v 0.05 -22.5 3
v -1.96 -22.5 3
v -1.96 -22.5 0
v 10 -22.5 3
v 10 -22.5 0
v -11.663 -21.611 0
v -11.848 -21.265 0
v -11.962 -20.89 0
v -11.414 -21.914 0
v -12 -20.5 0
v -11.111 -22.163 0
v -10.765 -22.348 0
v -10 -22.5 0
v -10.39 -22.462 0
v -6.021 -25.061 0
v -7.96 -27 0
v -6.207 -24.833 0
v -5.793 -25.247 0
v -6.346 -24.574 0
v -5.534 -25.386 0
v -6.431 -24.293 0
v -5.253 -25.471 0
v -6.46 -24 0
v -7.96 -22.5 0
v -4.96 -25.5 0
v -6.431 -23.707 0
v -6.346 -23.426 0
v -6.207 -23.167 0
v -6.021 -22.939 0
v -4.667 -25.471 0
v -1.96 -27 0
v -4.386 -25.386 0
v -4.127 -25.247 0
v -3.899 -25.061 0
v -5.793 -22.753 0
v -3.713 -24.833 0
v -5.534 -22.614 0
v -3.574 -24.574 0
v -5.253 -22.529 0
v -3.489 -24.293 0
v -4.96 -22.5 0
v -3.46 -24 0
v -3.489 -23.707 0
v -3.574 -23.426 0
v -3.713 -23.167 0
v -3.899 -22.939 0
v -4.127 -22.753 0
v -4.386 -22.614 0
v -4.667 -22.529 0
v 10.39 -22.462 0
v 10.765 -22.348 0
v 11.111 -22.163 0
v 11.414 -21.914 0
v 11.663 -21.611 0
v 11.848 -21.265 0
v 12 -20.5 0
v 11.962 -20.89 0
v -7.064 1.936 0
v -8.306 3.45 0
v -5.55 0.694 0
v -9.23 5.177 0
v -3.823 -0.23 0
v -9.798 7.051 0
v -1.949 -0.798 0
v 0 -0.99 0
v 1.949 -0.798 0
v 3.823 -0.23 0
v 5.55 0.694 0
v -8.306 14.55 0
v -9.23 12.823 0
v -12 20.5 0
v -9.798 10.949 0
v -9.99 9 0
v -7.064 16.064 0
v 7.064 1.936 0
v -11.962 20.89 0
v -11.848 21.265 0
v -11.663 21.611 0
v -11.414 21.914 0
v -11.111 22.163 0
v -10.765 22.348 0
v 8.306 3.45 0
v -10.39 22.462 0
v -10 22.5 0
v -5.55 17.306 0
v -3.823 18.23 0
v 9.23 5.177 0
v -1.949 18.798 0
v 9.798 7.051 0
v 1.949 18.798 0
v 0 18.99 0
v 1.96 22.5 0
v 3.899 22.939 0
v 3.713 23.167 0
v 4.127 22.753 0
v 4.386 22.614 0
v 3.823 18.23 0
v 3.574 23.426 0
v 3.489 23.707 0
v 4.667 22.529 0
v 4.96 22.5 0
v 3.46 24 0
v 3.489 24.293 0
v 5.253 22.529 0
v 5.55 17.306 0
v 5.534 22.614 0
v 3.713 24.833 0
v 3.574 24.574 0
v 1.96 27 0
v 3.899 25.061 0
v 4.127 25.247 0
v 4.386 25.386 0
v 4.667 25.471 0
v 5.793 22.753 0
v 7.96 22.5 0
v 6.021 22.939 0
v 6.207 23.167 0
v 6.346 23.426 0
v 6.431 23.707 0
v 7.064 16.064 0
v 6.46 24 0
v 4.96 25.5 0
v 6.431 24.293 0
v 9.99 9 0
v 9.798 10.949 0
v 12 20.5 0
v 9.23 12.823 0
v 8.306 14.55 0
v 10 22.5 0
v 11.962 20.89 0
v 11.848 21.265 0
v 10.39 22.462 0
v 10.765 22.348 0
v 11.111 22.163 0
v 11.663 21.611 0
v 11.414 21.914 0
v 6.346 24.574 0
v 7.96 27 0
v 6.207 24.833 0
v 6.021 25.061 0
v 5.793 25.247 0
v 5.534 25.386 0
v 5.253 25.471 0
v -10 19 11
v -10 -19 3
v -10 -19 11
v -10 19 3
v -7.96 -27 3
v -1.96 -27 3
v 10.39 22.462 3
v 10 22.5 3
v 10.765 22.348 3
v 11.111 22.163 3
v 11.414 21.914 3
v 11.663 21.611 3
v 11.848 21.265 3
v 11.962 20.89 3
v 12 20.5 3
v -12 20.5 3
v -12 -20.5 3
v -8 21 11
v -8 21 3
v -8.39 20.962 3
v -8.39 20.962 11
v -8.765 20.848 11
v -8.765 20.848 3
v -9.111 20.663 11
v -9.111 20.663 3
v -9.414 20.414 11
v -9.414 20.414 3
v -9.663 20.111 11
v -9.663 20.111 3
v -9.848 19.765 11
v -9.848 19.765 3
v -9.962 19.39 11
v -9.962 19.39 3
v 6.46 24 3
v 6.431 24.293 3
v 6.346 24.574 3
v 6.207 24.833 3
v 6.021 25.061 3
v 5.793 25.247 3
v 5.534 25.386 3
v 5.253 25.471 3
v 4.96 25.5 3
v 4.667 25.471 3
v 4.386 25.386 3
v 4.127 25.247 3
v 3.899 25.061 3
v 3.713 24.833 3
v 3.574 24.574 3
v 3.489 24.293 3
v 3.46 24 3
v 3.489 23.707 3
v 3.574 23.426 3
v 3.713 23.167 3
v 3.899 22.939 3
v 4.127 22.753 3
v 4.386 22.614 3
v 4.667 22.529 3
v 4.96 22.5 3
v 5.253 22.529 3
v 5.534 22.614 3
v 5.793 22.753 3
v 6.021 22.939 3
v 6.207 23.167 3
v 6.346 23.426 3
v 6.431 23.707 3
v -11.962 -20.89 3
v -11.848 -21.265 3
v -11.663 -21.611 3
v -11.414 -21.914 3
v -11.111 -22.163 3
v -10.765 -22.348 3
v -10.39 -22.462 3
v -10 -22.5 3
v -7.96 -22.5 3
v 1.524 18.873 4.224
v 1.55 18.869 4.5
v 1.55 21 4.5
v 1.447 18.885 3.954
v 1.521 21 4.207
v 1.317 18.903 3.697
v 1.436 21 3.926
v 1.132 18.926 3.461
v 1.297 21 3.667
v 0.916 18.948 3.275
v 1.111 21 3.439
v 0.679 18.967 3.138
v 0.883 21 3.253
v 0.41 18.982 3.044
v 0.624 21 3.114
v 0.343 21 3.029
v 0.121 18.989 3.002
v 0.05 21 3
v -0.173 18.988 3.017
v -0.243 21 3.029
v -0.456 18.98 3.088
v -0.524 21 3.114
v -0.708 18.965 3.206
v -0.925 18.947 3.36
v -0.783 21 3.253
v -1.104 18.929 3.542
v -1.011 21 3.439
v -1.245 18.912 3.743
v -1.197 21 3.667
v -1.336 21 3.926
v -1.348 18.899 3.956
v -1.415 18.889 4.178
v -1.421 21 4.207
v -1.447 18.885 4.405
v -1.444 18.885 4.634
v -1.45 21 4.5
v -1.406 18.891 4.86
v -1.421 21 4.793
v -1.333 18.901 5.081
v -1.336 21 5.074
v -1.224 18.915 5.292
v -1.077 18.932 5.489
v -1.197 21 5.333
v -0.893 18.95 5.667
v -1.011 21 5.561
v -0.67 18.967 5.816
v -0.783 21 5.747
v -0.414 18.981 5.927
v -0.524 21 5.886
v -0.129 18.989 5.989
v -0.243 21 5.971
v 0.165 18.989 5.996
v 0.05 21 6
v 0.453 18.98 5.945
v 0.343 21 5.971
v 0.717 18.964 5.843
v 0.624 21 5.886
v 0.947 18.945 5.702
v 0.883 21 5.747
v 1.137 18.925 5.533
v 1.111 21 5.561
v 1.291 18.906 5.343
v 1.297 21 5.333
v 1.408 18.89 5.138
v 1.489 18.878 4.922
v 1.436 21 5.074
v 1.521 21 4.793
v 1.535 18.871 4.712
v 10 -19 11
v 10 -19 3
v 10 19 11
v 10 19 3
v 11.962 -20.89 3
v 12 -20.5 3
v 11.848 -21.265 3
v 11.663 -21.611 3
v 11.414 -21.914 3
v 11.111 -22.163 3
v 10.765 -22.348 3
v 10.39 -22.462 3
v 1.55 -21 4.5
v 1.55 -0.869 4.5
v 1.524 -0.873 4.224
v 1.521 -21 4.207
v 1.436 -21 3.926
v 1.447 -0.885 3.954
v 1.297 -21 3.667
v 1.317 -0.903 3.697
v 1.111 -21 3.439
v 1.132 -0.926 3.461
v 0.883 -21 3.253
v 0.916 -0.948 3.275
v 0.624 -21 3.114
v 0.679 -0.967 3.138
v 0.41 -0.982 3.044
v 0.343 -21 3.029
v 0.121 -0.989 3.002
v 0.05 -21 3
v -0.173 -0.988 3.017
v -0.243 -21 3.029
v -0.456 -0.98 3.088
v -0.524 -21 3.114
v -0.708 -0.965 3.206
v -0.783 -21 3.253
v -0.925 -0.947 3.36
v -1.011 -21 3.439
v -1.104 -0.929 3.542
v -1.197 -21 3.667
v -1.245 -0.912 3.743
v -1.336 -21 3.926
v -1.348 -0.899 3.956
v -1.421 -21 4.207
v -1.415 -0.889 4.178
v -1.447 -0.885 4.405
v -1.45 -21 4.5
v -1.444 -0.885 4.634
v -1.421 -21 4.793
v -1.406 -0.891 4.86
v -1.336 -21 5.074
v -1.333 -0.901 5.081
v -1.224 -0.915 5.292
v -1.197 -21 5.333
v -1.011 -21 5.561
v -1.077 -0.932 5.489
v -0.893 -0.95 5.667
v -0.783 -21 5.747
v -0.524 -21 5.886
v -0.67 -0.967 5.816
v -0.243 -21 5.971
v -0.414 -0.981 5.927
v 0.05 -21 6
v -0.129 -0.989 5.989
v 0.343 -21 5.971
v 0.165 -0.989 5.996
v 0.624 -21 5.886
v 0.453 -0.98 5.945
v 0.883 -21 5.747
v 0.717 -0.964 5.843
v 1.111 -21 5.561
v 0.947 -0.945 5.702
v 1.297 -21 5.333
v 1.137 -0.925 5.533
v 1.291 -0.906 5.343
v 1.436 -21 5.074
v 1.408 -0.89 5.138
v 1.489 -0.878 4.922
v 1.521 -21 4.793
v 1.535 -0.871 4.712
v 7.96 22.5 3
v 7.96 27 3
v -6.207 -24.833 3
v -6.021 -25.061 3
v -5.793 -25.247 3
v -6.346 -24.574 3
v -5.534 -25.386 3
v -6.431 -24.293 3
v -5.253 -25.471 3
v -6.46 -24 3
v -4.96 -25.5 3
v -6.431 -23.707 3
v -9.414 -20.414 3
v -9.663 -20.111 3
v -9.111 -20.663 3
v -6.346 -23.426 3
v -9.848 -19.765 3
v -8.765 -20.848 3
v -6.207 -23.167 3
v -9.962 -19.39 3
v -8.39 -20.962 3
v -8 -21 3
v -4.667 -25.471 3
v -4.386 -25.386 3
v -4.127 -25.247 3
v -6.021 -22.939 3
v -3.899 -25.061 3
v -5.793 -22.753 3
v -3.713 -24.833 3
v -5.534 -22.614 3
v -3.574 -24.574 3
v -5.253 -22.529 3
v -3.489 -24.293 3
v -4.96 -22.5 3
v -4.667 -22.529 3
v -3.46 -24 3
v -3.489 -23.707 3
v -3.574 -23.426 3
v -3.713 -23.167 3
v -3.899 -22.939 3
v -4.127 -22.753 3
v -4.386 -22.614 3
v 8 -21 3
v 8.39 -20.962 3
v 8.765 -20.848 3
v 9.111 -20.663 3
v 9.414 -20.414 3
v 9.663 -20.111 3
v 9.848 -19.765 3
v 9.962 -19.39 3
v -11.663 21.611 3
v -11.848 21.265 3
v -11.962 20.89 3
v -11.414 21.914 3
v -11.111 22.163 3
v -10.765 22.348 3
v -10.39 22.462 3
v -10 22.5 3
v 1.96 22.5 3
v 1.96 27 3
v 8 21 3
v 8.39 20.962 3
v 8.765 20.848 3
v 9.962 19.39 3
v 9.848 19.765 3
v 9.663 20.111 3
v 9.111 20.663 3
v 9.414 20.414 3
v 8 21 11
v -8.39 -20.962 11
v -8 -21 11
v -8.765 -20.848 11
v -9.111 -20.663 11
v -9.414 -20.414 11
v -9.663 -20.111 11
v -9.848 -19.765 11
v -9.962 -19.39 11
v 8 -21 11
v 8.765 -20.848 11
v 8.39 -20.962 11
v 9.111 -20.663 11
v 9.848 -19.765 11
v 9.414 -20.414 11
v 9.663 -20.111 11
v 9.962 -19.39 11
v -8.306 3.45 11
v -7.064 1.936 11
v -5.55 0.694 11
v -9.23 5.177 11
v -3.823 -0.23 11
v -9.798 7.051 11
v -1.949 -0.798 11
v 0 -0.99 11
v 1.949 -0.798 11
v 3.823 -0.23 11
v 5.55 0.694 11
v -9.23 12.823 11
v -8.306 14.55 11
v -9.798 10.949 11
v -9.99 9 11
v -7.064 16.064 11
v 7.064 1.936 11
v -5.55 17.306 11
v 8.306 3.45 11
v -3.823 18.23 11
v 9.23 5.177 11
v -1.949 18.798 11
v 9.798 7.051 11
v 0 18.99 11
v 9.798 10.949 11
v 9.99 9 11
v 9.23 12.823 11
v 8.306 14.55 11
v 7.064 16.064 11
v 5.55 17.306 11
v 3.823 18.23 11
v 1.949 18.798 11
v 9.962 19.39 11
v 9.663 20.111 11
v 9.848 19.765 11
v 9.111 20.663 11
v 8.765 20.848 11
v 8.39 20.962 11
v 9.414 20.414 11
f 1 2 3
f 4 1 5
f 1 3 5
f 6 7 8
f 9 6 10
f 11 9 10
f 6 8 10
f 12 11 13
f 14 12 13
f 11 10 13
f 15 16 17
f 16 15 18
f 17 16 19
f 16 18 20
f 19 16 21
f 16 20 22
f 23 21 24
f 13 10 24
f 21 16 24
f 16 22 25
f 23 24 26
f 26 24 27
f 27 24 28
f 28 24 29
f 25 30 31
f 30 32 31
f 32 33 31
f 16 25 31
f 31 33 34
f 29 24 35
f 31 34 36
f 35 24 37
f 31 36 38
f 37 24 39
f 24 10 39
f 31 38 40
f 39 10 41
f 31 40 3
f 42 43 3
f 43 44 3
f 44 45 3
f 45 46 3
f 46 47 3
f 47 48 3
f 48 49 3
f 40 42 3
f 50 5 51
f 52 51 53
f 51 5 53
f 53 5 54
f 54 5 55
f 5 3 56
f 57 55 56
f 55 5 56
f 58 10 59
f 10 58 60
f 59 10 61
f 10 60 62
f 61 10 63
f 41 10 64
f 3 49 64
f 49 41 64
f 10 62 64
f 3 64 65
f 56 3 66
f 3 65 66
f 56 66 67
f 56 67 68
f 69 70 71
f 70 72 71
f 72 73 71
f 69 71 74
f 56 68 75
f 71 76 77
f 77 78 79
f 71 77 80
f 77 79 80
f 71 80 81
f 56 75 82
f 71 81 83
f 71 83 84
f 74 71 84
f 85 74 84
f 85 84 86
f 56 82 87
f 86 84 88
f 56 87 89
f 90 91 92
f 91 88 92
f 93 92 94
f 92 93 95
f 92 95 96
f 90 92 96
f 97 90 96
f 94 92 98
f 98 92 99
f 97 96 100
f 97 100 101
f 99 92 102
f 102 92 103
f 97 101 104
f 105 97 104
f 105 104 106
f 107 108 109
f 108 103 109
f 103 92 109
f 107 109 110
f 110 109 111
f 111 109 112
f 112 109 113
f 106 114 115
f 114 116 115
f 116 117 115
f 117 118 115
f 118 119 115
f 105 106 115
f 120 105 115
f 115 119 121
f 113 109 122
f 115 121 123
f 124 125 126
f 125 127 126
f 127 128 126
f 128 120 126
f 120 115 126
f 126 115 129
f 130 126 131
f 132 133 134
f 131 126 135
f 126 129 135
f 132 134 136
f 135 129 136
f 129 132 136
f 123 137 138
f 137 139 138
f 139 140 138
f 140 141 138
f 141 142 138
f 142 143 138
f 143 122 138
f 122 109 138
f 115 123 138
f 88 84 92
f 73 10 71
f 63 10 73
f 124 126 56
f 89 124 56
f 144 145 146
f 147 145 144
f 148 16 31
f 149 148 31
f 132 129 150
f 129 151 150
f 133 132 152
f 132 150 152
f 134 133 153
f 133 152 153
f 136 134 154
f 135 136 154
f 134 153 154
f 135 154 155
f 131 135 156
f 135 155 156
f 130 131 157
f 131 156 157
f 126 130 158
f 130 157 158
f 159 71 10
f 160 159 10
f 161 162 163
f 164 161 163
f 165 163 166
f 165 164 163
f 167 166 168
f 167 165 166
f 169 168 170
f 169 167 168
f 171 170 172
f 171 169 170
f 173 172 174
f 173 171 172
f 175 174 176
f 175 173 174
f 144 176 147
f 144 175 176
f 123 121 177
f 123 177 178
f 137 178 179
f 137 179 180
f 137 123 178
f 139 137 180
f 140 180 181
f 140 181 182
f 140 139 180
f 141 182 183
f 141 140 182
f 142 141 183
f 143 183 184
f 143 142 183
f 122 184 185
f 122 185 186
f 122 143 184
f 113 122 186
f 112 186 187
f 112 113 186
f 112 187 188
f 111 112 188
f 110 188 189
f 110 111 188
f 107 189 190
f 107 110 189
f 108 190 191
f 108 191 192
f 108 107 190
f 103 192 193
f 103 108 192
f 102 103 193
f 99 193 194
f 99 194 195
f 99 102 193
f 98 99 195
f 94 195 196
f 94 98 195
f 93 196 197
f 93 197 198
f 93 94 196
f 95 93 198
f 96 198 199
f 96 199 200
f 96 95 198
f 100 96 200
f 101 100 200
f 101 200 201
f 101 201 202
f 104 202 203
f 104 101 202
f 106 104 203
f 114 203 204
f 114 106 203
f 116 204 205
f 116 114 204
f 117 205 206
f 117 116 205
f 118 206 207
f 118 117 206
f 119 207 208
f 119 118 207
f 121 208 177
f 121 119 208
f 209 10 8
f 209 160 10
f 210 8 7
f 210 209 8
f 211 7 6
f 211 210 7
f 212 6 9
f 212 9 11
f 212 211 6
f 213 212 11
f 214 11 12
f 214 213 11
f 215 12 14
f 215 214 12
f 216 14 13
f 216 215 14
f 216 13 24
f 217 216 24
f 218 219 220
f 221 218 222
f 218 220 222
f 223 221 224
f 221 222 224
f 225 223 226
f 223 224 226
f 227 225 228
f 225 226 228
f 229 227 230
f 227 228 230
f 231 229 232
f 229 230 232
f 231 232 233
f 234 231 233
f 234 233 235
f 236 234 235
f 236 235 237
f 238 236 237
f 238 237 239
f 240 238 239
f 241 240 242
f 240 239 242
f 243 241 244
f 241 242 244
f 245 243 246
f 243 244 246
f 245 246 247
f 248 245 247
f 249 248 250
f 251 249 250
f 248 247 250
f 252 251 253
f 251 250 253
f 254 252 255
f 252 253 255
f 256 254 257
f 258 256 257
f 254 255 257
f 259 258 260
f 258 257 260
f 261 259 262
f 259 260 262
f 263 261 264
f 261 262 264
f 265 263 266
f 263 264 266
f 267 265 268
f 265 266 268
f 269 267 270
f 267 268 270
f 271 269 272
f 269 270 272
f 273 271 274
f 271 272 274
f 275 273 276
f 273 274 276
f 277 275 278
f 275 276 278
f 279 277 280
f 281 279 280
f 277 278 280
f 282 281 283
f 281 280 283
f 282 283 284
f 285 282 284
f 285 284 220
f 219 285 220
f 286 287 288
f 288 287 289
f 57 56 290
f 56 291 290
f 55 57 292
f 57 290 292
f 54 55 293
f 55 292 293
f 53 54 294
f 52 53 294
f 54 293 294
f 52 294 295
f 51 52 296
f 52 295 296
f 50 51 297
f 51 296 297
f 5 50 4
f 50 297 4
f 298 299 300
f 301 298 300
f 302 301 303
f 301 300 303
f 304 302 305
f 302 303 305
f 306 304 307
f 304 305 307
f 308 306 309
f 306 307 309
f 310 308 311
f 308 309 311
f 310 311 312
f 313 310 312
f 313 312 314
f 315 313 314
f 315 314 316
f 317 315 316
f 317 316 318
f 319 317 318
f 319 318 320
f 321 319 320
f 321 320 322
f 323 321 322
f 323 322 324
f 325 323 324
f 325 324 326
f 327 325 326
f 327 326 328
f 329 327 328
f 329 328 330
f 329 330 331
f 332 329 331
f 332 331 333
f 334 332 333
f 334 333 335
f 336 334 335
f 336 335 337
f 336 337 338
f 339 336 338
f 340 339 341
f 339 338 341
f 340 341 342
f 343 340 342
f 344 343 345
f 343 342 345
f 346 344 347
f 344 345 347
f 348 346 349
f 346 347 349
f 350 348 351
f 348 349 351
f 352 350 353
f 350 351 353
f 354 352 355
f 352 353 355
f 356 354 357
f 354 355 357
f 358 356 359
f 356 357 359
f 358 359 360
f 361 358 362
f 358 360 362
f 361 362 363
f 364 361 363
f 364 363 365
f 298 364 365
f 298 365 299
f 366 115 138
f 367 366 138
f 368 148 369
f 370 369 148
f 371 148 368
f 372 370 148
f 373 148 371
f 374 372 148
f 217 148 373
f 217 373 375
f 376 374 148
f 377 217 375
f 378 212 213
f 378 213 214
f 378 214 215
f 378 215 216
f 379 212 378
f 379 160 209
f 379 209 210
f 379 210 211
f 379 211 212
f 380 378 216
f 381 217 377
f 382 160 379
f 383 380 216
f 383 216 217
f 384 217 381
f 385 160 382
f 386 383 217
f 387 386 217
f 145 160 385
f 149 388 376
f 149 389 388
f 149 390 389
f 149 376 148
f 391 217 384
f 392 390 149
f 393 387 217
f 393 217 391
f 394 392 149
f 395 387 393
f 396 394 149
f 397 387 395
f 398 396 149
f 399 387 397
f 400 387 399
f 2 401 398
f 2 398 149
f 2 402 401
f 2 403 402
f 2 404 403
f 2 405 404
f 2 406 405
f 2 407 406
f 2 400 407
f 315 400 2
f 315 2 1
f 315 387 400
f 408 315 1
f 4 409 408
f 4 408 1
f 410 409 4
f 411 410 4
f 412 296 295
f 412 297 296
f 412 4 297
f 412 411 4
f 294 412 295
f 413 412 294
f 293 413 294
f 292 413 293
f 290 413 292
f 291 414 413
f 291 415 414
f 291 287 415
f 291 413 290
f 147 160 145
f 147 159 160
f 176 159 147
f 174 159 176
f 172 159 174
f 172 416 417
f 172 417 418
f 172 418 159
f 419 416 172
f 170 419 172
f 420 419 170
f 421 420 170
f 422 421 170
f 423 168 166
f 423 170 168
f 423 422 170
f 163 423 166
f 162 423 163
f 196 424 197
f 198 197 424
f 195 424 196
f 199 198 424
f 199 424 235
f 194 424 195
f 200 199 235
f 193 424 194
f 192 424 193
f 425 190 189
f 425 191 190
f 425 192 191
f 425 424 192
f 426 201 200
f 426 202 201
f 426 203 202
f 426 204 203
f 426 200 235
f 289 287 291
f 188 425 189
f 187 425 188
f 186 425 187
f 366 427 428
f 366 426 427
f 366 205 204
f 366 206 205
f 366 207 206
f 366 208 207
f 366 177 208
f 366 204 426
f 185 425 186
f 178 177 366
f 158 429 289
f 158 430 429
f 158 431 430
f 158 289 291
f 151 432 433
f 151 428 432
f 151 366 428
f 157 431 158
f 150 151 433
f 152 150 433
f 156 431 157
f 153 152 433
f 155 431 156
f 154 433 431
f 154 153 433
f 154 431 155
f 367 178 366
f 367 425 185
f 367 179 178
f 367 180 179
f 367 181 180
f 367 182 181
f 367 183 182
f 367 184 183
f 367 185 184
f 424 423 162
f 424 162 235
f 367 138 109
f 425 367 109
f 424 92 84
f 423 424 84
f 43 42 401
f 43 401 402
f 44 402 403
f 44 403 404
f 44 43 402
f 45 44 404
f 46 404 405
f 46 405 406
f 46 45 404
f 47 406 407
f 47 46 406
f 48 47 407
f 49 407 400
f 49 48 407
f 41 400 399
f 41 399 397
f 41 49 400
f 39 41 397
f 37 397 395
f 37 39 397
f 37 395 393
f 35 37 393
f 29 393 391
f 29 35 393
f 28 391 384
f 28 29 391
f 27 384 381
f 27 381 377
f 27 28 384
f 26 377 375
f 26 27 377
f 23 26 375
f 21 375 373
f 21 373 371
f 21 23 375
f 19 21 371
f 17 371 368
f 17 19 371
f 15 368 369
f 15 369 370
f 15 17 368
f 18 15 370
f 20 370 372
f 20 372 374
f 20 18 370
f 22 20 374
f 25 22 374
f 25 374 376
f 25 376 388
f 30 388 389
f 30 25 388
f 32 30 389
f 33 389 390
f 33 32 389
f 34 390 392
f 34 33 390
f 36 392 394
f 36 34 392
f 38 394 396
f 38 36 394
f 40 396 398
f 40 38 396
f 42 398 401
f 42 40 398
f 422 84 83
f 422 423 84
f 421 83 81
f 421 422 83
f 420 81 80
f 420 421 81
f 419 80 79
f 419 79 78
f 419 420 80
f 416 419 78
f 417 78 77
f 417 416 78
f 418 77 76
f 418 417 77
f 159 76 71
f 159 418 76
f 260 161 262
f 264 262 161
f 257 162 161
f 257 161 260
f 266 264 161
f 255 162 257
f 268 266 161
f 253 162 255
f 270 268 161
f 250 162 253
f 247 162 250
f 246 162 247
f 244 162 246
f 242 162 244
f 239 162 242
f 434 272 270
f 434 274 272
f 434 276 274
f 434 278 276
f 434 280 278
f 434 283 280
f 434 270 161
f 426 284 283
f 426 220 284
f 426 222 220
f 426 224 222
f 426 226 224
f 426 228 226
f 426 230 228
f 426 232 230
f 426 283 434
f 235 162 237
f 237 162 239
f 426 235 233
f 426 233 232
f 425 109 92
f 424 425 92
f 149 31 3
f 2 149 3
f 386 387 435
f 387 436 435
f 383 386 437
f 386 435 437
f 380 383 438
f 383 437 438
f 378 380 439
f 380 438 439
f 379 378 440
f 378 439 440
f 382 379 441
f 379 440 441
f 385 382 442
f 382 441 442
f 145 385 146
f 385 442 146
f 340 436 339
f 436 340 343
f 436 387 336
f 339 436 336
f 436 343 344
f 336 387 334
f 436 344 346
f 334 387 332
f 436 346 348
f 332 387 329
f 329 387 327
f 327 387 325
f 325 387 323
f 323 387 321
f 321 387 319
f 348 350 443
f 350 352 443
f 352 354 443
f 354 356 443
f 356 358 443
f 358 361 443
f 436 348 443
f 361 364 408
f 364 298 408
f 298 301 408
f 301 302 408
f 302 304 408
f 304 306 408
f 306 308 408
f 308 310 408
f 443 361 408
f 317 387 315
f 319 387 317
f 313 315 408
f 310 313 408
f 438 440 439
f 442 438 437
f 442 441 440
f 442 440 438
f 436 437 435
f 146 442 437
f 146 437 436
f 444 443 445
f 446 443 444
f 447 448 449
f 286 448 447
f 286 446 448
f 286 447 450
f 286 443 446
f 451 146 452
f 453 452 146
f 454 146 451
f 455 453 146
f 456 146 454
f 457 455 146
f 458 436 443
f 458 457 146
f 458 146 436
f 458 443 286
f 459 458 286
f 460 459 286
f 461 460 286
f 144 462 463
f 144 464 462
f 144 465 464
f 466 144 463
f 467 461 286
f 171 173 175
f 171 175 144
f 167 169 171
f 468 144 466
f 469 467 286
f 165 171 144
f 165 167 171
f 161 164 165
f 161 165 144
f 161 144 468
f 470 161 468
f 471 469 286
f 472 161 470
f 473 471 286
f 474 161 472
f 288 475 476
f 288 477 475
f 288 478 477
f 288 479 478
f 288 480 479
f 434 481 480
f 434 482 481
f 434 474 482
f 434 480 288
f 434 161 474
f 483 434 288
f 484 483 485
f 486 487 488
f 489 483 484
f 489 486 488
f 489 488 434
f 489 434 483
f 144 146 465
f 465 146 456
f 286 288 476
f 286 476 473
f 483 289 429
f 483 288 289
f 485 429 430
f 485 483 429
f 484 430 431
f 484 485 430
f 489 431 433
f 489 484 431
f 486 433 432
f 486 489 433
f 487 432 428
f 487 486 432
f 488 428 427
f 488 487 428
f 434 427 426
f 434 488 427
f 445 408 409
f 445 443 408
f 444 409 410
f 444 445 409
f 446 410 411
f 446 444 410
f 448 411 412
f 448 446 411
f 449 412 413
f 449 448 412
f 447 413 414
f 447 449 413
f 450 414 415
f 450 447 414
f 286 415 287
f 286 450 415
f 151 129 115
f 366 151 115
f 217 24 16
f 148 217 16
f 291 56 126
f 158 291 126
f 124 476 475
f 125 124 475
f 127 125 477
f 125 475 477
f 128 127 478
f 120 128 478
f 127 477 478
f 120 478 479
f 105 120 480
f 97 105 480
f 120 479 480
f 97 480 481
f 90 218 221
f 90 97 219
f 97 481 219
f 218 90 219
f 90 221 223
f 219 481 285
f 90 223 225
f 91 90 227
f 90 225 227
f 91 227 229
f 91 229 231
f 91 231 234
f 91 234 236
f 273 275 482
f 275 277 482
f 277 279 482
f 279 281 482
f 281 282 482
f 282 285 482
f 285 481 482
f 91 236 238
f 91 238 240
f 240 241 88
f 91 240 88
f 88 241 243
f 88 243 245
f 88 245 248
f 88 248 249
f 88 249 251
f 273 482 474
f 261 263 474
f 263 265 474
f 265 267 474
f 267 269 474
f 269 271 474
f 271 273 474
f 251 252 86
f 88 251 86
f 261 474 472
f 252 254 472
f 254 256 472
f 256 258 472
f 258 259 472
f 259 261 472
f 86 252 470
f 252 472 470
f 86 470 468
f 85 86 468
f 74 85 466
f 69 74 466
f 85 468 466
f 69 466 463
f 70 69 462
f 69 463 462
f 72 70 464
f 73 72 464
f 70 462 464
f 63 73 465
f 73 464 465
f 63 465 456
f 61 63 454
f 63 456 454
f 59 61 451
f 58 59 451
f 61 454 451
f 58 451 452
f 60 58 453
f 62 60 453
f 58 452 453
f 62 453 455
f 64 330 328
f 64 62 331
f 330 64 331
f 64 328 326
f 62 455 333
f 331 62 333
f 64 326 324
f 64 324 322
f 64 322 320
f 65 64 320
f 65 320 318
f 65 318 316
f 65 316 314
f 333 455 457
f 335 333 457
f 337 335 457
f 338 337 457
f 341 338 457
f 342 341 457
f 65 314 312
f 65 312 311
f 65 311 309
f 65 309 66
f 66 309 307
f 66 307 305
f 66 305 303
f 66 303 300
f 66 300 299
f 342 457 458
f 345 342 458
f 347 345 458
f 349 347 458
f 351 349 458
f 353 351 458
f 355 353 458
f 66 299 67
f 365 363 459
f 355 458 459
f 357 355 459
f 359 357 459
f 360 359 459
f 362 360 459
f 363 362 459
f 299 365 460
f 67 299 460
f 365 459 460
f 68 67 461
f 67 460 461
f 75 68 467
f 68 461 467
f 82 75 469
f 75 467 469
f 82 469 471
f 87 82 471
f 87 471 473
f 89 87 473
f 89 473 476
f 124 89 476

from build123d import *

# Parameters (mm, degrees)
SKETCH1_R           = 1.5
BOSS_EXTRUDE1_DEPTH = 3
FILLET1_R           = 2
SKETCH3_W           = 20
SKETCH3_H           = 42
BOSS_EXTRUDE2_DEPTH = 8
FILLET2_R           = 2
SKETCH4_R           = 9.99
CUT_EXTRUDE1_DEPTH  = 12
SKETCH5_R           = 1.5
CUT_EXTRUDE2_DEPTH  = 49


with BuildPart() as part:
    # Sketch1 → Boss-Extrude1 (new body)
    with BuildSketch(Plane.XY):
        Polygon((12, 22.5), (7.96, 22.5), (7.96, 27), (1.96, 27), (1.96, 22.5), (-12, 22.5), (-12, -22.5), (-7.96, -22.5), (-7.96, -27), (-1.96, -27), (-1.96, -22.5), (12, -22.5), align=None)
        with Locations((4.96, 24)):
            Circle(SKETCH1_R, mode=Mode.SUBTRACT)
        with Locations((-4.96, -24)):
            Circle(SKETCH1_R, mode=Mode.SUBTRACT)
    extrude(amount=BOSS_EXTRUDE1_DEPTH)

    # Fillet1
    fillet1_edges = [part.edges().sort_by_distance(p)[0] for p in [
        (-12, 22.5, 1.5),
        (12, 22.5, 1.5),
        (12, -22.5, 1.5),
        (-12, -22.5, 1.5),
    ]]
    fillet(fillet1_edges, radius=FILLET1_R)

    # Sketch3 → Boss-Extrude2 (add)
    with BuildSketch(Plane.XY.offset(3)):
        Rectangle(SKETCH3_W, SKETCH3_H)
    extrude(amount=BOSS_EXTRUDE2_DEPTH)

    # Fillet2
    fillet2_edges = [part.edges().sort_by_distance(p)[0] for p in [
        (-10, 21, 7),
        (-10, -21, 7),
        (10, -21, 7),
        (10, 21, 7),
    ]]
    fillet(fillet2_edges, radius=FILLET2_R)

    # Sketch4 → Cut-Extrude1 (cut, through all)
    with BuildSketch(Plane.XY.offset(11)):
        with Locations((0, 9)):
            Circle(SKETCH4_R)
    extrude(amount=-CUT_EXTRUDE1_DEPTH, mode=Mode.SUBTRACT)

    # Sketch5 → Cut-Extrude2 (cut, through all)
    with BuildSketch(Plane(origin=(0, 21, 0), x_dir=(1, 0, 0), z_dir=(0, 1, 0))):
        with Locations((0.05, -4.5)):
            Circle(SKETCH5_R)
    extrude(amount=-CUT_EXTRUDE2_DEPTH, mode=Mode.SUBTRACT)


solid = part.part
